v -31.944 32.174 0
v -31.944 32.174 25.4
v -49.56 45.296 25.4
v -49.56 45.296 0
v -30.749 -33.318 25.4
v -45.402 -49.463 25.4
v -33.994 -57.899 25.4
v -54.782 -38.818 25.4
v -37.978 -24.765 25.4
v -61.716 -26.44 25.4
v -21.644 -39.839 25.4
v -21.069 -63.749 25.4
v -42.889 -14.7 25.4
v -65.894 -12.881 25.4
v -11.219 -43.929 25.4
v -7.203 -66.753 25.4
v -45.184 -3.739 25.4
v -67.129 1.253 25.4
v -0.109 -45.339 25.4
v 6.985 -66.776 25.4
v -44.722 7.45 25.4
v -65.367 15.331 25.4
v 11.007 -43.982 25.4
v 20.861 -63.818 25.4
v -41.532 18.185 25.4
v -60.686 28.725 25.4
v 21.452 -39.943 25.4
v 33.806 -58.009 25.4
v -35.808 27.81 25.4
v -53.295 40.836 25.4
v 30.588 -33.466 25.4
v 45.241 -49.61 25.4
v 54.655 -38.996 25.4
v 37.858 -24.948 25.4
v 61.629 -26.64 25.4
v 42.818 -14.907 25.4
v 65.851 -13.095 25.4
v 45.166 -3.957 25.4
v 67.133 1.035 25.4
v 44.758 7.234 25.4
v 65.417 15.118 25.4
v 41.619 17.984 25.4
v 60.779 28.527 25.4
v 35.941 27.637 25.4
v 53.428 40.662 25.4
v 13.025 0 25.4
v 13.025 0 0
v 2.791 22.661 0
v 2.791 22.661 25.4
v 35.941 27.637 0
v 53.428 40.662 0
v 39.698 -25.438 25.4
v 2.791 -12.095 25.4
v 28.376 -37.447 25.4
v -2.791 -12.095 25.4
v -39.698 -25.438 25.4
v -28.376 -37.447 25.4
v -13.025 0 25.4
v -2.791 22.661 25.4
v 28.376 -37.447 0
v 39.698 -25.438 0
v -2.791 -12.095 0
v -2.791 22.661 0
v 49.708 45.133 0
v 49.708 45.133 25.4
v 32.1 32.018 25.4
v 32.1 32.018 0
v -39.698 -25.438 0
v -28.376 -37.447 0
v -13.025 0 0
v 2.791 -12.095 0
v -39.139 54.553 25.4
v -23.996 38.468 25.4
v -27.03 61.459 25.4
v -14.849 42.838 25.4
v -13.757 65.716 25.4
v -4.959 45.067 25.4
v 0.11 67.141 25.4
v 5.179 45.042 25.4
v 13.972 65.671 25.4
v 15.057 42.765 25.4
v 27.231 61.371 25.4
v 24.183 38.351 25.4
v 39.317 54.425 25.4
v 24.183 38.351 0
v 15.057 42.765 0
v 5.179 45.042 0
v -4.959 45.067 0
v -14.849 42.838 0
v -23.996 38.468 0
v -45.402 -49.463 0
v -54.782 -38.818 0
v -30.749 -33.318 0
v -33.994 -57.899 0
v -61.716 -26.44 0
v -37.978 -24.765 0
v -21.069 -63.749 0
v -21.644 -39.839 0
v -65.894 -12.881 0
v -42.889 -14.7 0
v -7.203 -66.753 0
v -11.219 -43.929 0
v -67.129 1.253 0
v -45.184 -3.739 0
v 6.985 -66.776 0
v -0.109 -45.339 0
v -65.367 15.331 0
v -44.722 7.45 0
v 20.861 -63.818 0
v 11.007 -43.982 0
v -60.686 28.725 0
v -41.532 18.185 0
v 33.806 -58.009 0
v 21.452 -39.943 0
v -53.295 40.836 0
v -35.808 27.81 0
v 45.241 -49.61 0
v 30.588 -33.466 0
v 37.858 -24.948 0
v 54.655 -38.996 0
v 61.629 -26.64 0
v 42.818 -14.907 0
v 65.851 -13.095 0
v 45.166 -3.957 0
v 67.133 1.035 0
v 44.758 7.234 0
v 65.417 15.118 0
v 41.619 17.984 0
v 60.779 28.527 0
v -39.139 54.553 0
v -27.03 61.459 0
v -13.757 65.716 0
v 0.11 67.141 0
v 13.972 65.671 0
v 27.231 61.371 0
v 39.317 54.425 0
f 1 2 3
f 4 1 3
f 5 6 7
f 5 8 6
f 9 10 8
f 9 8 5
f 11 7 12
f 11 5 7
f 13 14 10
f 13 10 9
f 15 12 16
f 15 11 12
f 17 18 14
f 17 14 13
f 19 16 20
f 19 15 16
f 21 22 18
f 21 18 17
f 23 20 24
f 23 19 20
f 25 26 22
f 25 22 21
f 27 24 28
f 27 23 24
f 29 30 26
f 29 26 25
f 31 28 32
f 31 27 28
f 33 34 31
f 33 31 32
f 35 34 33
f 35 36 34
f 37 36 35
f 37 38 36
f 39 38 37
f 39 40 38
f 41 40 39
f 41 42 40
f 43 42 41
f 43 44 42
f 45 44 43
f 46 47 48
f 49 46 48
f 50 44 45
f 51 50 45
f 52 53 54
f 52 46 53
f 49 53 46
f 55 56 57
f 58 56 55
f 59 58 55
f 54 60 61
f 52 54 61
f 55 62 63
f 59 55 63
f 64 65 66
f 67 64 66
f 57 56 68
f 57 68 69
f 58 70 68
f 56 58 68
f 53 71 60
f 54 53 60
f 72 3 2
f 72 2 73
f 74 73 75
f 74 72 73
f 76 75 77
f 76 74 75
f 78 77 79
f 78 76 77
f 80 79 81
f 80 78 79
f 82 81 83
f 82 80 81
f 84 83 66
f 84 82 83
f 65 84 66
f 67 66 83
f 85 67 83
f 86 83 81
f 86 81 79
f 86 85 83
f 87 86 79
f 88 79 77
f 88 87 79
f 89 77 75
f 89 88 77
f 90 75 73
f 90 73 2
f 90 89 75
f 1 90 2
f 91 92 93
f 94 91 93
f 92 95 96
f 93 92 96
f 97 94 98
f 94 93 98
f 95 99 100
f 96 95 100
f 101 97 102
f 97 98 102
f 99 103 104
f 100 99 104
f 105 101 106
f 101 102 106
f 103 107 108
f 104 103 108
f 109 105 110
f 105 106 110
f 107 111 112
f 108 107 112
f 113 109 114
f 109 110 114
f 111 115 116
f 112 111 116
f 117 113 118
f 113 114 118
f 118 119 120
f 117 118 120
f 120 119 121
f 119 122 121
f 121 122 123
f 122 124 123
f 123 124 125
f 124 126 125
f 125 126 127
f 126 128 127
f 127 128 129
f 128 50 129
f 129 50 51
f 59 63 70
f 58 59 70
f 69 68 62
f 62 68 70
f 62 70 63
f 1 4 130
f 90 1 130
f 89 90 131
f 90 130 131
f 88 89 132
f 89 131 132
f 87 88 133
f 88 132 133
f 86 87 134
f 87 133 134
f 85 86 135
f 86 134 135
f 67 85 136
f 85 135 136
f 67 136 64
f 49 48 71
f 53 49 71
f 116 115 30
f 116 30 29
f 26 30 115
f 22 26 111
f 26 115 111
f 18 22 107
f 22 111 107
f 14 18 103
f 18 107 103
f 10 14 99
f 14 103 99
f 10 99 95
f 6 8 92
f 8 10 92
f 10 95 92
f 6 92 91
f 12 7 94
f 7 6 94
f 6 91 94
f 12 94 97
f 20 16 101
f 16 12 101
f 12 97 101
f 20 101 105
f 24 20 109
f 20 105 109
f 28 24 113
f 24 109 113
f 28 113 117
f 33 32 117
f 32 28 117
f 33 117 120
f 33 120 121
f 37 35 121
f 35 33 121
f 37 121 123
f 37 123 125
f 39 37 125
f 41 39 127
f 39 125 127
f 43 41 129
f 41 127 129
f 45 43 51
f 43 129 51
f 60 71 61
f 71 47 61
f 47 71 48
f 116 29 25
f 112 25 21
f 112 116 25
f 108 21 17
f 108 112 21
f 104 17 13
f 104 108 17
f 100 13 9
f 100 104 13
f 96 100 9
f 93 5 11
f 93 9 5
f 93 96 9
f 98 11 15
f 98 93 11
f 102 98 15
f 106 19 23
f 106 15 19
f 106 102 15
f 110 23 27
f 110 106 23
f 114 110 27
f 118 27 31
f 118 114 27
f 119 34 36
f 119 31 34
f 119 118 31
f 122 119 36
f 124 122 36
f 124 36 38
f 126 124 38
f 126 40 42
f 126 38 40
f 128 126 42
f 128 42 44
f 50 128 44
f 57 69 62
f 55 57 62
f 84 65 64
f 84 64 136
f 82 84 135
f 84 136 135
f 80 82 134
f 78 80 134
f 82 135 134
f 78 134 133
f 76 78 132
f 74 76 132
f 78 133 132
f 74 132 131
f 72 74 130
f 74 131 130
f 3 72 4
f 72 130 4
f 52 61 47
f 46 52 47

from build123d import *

# Parameters (mm, degrees)
F0_R     = 67.140802
F1_DEPTH = 25.4
F2_R     = 45.338721
F3_DEPTH = 25.4
F5_DEPTH = 25.4
F6_DEPTH = 25.4
F8_DEPTH = 25.4


with BuildPart() as f1:
    # F0 (on Top) → F1 (new body)
    with BuildSketch(Plane.XY):
        Circle(F0_R)
    extrude(amount=F1_DEPTH)

    # F2 (on Top) → F3 (cut)
    with BuildSketch(Plane.XY):
        Circle(F2_R)
    extrude(amount=F3_DEPTH, mode=Mode.SUBTRACT)

    # F4 (on Top) → F5 (cut)
    with BuildSketch(Plane.XY):
        Polygon((-57.100676, 43.670323), (-35.660278, 27.700296), (-31.101426, 31.546712), (-53.631231, 48.328191), align=None)
        Polygon((35.713796, 27.467711), (57.154194, 43.437738), (53.684748, 48.095607), (31.154943, 31.314127), align=None)
    extrude(amount=F5_DEPTH, mode=Mode.SUBTRACT)

    # F4 (on Top) → F6 (cut)
    with BuildSketch(Plane.XY):
        Polygon((-57.100676, 43.670323), (-35.660278, 27.700296), (-31.101426, 31.546712), (-53.631231, 48.328191), align=None)
        Polygon((35.713796, 27.467711), (57.154194, 43.437738), (53.684748, 48.095607), (31.154943, 31.314127), align=None)
    extrude(amount=F6_DEPTH, mode=Mode.SUBTRACT)


with BuildPart() as f8:
    # F7 (on Top) → F8 (new body)
    with BuildSketch(Plane.XY):
        Polygon((-2.791047, -12.094535), (-2.791047, 22.66064), (-13.024885, 0), (-39.698261, -25.437786), (-28.375641, -37.446544), align=None)
        Polygon((13.024885, 0), (2.791047, 22.66064), (2.791047, -12.094535), (28.375641, -37.446544), (39.698261, -25.437786), align=None)
    extrude(amount=F8_DEPTH)


solid = Compound([f1.part, f8.part])
